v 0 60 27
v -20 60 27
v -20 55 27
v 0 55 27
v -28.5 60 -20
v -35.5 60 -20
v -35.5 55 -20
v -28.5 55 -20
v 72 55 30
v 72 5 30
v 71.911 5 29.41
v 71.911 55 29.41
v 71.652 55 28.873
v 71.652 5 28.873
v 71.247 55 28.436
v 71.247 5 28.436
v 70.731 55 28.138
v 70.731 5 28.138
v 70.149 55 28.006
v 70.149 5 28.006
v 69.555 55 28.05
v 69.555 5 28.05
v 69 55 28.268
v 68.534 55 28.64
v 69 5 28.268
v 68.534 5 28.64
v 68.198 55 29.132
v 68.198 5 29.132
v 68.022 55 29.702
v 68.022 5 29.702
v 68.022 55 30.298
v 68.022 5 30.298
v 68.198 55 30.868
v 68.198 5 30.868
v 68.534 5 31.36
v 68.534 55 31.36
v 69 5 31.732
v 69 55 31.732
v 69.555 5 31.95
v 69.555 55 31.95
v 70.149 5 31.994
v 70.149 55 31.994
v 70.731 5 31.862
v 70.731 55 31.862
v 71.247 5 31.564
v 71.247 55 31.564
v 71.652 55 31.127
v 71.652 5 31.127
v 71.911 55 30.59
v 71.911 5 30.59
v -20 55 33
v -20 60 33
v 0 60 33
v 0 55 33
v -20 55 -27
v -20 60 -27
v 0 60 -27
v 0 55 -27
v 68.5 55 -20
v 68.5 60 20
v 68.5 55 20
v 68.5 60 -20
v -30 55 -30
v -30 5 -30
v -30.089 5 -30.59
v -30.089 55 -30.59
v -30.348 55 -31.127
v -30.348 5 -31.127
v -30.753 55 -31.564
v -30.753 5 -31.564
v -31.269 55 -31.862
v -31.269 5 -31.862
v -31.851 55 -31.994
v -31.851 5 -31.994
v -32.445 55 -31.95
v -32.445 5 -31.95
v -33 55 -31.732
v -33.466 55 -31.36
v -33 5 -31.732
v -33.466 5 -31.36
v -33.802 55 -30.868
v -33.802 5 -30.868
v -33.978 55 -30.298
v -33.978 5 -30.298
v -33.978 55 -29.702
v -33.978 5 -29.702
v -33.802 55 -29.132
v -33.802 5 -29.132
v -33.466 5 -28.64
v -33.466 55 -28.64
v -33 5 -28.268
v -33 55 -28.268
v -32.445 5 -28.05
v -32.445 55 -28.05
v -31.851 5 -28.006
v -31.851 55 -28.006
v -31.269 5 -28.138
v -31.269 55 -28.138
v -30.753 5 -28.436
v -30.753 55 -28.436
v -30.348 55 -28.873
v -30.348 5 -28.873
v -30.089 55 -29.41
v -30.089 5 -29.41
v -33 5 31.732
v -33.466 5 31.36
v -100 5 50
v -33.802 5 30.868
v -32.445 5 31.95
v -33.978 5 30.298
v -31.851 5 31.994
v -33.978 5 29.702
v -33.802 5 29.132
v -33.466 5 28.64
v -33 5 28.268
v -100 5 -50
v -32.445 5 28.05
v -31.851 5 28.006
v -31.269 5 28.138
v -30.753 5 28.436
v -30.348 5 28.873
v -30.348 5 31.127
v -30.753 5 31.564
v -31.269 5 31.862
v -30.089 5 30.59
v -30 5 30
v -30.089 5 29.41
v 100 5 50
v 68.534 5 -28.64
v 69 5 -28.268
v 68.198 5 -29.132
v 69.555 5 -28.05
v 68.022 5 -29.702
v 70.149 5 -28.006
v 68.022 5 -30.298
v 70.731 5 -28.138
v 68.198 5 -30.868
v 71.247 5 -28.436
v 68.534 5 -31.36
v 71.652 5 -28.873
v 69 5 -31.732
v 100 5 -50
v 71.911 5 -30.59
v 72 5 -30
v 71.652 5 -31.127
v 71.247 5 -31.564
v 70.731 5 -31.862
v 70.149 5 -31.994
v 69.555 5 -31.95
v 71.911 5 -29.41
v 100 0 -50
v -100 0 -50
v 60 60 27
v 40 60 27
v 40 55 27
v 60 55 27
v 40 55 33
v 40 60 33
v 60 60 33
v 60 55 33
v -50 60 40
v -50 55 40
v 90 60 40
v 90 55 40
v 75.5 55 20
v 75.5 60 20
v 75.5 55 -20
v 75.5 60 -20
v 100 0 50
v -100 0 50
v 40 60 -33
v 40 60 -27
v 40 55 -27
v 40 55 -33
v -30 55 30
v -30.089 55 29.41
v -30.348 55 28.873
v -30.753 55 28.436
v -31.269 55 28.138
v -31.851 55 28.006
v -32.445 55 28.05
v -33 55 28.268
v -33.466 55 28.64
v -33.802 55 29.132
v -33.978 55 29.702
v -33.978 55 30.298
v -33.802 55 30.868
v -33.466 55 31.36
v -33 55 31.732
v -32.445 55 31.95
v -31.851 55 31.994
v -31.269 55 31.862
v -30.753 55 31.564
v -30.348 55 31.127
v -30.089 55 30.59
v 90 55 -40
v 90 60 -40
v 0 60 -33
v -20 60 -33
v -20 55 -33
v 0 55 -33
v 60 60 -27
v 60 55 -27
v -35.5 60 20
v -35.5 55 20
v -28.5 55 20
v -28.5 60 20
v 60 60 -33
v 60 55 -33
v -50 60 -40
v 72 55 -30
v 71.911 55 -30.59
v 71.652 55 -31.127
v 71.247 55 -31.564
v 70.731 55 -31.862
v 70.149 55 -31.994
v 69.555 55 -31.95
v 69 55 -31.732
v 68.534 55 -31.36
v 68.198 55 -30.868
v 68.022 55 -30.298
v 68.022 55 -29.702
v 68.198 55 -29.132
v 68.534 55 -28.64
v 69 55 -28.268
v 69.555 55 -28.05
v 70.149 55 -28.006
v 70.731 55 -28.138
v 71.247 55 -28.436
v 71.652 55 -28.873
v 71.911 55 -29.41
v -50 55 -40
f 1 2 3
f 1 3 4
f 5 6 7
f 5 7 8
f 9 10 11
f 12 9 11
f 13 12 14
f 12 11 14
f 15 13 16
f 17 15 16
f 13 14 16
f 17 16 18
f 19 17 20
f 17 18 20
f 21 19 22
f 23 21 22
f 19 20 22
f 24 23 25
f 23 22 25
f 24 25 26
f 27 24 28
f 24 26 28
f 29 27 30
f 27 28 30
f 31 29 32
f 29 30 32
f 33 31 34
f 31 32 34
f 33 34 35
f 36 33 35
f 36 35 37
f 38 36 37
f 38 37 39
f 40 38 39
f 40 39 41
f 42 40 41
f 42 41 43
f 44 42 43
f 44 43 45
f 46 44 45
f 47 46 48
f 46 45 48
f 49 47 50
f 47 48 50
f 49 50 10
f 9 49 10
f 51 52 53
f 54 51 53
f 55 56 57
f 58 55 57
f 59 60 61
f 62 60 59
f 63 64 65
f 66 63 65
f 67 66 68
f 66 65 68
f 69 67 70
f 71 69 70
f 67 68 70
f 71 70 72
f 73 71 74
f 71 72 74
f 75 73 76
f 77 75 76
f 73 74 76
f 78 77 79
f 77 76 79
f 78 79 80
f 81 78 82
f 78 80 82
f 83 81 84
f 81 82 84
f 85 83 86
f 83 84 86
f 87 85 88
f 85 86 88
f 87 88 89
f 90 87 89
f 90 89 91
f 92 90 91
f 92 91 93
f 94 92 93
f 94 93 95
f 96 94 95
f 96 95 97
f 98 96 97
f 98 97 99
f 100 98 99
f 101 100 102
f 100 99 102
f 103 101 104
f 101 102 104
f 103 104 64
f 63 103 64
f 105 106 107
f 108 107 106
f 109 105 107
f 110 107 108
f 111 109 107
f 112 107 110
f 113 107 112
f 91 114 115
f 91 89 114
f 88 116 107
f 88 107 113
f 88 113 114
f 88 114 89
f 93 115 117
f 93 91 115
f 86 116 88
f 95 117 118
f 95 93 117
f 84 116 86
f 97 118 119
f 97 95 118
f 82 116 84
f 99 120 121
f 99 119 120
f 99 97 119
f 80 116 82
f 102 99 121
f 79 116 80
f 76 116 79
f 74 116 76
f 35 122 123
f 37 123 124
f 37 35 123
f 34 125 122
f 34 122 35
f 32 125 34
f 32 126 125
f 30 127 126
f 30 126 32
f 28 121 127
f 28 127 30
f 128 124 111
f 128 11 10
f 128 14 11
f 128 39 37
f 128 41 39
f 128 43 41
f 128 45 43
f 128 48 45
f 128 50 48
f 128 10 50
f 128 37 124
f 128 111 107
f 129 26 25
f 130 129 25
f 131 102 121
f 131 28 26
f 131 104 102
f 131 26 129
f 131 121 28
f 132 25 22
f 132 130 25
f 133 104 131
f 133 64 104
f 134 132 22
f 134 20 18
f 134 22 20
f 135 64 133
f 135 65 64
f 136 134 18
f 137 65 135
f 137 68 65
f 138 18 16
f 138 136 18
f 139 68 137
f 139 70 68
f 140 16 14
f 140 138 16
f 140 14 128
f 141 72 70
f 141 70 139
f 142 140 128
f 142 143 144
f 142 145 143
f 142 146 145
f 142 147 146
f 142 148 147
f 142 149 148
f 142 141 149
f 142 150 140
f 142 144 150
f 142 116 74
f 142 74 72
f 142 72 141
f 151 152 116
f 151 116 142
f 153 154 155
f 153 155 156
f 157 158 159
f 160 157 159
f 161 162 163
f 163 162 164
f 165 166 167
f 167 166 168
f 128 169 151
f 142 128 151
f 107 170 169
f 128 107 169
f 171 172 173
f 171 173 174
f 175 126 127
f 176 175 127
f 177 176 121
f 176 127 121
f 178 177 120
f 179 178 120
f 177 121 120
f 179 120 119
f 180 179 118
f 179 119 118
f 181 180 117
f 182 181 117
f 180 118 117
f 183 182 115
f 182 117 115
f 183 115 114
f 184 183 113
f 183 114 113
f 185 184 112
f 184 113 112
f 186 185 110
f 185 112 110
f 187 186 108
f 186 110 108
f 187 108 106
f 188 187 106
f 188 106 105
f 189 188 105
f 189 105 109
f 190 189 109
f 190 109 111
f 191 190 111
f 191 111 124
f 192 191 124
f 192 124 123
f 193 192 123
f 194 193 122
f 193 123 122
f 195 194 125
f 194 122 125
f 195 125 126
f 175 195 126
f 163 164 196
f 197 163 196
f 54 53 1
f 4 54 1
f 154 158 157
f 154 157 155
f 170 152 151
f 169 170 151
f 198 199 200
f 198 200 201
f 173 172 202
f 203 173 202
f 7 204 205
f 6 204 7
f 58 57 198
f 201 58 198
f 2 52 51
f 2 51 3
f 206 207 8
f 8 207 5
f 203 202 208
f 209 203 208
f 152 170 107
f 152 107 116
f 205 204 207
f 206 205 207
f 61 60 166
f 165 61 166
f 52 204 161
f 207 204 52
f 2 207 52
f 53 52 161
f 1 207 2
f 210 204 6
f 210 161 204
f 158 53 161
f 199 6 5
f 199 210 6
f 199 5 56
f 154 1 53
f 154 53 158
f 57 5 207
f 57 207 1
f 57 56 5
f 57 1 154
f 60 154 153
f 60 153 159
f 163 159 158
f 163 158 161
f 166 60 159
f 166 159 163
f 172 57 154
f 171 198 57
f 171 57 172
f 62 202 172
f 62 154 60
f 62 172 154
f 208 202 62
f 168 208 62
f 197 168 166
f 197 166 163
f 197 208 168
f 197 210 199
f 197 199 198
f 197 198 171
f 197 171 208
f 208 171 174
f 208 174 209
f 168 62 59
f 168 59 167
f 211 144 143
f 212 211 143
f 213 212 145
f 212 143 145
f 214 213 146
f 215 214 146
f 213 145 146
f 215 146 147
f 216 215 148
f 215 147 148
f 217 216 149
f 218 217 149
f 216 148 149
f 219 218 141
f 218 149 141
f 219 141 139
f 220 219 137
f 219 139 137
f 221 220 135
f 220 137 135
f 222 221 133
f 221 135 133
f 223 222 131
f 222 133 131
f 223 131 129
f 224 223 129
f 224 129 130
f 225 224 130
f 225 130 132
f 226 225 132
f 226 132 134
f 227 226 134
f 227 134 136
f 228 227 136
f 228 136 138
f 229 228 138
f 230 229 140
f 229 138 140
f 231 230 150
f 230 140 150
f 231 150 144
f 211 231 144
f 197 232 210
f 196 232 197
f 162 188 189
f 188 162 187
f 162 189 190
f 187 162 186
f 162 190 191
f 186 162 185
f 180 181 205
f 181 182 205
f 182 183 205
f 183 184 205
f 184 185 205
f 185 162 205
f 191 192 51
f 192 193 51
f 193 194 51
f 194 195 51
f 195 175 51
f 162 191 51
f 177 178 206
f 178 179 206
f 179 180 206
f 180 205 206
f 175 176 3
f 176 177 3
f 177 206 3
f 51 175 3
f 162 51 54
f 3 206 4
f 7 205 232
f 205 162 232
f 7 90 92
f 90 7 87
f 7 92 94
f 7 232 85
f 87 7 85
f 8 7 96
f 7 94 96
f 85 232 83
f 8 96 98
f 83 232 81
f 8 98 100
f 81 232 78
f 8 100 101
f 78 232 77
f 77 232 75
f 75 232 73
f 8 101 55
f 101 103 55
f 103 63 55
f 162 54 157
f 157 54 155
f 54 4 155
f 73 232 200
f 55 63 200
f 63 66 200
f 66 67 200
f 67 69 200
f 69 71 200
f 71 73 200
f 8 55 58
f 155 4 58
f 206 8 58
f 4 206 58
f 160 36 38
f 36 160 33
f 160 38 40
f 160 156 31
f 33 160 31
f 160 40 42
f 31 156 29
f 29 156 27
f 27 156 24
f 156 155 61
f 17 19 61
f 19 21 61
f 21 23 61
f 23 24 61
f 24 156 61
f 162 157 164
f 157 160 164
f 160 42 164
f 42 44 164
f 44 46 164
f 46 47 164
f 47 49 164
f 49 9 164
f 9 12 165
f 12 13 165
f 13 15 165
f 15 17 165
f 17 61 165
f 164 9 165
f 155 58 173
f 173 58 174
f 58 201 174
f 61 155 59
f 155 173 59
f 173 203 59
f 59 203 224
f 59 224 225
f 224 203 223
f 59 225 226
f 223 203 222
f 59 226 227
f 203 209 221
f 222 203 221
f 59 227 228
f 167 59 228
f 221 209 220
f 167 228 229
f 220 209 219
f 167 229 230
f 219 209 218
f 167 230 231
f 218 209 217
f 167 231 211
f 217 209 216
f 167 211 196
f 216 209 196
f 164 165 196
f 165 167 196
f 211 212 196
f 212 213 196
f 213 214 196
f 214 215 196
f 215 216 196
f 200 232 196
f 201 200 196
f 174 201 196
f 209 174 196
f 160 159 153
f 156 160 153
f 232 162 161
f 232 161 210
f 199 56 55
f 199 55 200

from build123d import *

# Parameters (mm, degrees)
SKETCH1_W           = 200
SKETCH1_H           = 100
BOSS_EXTRUDE2_DEPTH = 5
SKETCH2_R           = 2
BOSS_EXTRUDE3_DEPTH = 50
SKETCH3_W           = 140
SKETCH3_H           = 80
BOSS_EXTRUDE4_DEPTH = 5
SKETCH4_W           = 20
SKETCH4_H           = 6
CUT_EXTRUDE1_DEPTH  = 5
SKETCH7_W           = 7
SKETCH7_H           = 40
CUT_EXTRUDE2_DEPTH  = 5


with BuildPart() as part:
    # Sketch1 → Boss-Extrude2 (new body)
    with BuildSketch(Plane(origin=(0, 0, 0), x_dir=(1, 0, 0), z_dir=(0, 1, 0))):
        Rectangle(SKETCH1_W, SKETCH1_H)
    extrude(amount=BOSS_EXTRUDE2_DEPTH)

    # Sketch2 → Boss-Extrude3 (add)
    with BuildSketch(Plane(origin=(0, 5, 0), x_dir=(1, 0, 0), z_dir=(0, 1, 0))):
        with Locations((70, -30)):
            Circle(SKETCH2_R)
        with Locations((-32, -30)):
            Circle(SKETCH2_R)
        with Locations((70, 30)):
            Circle(SKETCH2_R)
        with Locations((-32, 30)):
            Circle(SKETCH2_R)
    extrude(amount=BOSS_EXTRUDE3_DEPTH)

    # Sketch3 → Boss-Extrude4 (add)
    with BuildSketch(Plane(origin=(0, 55, 0), x_dir=(1, 0, 0), z_dir=(0, 1, 0))):
        with Locations((20, 0)):
            Rectangle(SKETCH3_W, SKETCH3_H)
    extrude(amount=BOSS_EXTRUDE4_DEPTH)

    # Sketch4 → Cut-Extrude1 (cut)
    with BuildSketch(Plane(origin=(0, 60, 0), x_dir=(1, 0, 0), z_dir=(0, 1, 0))):
        with Locations((-10, 30)):
            Rectangle(SKETCH4_W, SKETCH4_H)
        with Locations((-10, -30)):
            Rectangle(SKETCH4_W, SKETCH4_H)
        with Locations((50, -30)):
            Rectangle(SKETCH4_W, SKETCH4_H)
        with Locations((50, 30)):
            Rectangle(SKETCH4_W, SKETCH4_H)
    extrude(amount=-CUT_EXTRUDE1_DEPTH, mode=Mode.SUBTRACT)

    # Sketch7 → Cut-Extrude2 (cut)
    with BuildSketch(Plane(origin=(0, 60, 0), x_dir=(1, 0, 0), z_dir=(0, 1, 0))):
        with Locations((-32, 0)):
            Rectangle(SKETCH7_W, SKETCH7_H)
        with Locations((72, 0)):
            Rectangle(SKETCH7_W, SKETCH7_H)
    extrude(amount=-CUT_EXTRUDE2_DEPTH, mode=Mode.SUBTRACT)


solid = part.part
